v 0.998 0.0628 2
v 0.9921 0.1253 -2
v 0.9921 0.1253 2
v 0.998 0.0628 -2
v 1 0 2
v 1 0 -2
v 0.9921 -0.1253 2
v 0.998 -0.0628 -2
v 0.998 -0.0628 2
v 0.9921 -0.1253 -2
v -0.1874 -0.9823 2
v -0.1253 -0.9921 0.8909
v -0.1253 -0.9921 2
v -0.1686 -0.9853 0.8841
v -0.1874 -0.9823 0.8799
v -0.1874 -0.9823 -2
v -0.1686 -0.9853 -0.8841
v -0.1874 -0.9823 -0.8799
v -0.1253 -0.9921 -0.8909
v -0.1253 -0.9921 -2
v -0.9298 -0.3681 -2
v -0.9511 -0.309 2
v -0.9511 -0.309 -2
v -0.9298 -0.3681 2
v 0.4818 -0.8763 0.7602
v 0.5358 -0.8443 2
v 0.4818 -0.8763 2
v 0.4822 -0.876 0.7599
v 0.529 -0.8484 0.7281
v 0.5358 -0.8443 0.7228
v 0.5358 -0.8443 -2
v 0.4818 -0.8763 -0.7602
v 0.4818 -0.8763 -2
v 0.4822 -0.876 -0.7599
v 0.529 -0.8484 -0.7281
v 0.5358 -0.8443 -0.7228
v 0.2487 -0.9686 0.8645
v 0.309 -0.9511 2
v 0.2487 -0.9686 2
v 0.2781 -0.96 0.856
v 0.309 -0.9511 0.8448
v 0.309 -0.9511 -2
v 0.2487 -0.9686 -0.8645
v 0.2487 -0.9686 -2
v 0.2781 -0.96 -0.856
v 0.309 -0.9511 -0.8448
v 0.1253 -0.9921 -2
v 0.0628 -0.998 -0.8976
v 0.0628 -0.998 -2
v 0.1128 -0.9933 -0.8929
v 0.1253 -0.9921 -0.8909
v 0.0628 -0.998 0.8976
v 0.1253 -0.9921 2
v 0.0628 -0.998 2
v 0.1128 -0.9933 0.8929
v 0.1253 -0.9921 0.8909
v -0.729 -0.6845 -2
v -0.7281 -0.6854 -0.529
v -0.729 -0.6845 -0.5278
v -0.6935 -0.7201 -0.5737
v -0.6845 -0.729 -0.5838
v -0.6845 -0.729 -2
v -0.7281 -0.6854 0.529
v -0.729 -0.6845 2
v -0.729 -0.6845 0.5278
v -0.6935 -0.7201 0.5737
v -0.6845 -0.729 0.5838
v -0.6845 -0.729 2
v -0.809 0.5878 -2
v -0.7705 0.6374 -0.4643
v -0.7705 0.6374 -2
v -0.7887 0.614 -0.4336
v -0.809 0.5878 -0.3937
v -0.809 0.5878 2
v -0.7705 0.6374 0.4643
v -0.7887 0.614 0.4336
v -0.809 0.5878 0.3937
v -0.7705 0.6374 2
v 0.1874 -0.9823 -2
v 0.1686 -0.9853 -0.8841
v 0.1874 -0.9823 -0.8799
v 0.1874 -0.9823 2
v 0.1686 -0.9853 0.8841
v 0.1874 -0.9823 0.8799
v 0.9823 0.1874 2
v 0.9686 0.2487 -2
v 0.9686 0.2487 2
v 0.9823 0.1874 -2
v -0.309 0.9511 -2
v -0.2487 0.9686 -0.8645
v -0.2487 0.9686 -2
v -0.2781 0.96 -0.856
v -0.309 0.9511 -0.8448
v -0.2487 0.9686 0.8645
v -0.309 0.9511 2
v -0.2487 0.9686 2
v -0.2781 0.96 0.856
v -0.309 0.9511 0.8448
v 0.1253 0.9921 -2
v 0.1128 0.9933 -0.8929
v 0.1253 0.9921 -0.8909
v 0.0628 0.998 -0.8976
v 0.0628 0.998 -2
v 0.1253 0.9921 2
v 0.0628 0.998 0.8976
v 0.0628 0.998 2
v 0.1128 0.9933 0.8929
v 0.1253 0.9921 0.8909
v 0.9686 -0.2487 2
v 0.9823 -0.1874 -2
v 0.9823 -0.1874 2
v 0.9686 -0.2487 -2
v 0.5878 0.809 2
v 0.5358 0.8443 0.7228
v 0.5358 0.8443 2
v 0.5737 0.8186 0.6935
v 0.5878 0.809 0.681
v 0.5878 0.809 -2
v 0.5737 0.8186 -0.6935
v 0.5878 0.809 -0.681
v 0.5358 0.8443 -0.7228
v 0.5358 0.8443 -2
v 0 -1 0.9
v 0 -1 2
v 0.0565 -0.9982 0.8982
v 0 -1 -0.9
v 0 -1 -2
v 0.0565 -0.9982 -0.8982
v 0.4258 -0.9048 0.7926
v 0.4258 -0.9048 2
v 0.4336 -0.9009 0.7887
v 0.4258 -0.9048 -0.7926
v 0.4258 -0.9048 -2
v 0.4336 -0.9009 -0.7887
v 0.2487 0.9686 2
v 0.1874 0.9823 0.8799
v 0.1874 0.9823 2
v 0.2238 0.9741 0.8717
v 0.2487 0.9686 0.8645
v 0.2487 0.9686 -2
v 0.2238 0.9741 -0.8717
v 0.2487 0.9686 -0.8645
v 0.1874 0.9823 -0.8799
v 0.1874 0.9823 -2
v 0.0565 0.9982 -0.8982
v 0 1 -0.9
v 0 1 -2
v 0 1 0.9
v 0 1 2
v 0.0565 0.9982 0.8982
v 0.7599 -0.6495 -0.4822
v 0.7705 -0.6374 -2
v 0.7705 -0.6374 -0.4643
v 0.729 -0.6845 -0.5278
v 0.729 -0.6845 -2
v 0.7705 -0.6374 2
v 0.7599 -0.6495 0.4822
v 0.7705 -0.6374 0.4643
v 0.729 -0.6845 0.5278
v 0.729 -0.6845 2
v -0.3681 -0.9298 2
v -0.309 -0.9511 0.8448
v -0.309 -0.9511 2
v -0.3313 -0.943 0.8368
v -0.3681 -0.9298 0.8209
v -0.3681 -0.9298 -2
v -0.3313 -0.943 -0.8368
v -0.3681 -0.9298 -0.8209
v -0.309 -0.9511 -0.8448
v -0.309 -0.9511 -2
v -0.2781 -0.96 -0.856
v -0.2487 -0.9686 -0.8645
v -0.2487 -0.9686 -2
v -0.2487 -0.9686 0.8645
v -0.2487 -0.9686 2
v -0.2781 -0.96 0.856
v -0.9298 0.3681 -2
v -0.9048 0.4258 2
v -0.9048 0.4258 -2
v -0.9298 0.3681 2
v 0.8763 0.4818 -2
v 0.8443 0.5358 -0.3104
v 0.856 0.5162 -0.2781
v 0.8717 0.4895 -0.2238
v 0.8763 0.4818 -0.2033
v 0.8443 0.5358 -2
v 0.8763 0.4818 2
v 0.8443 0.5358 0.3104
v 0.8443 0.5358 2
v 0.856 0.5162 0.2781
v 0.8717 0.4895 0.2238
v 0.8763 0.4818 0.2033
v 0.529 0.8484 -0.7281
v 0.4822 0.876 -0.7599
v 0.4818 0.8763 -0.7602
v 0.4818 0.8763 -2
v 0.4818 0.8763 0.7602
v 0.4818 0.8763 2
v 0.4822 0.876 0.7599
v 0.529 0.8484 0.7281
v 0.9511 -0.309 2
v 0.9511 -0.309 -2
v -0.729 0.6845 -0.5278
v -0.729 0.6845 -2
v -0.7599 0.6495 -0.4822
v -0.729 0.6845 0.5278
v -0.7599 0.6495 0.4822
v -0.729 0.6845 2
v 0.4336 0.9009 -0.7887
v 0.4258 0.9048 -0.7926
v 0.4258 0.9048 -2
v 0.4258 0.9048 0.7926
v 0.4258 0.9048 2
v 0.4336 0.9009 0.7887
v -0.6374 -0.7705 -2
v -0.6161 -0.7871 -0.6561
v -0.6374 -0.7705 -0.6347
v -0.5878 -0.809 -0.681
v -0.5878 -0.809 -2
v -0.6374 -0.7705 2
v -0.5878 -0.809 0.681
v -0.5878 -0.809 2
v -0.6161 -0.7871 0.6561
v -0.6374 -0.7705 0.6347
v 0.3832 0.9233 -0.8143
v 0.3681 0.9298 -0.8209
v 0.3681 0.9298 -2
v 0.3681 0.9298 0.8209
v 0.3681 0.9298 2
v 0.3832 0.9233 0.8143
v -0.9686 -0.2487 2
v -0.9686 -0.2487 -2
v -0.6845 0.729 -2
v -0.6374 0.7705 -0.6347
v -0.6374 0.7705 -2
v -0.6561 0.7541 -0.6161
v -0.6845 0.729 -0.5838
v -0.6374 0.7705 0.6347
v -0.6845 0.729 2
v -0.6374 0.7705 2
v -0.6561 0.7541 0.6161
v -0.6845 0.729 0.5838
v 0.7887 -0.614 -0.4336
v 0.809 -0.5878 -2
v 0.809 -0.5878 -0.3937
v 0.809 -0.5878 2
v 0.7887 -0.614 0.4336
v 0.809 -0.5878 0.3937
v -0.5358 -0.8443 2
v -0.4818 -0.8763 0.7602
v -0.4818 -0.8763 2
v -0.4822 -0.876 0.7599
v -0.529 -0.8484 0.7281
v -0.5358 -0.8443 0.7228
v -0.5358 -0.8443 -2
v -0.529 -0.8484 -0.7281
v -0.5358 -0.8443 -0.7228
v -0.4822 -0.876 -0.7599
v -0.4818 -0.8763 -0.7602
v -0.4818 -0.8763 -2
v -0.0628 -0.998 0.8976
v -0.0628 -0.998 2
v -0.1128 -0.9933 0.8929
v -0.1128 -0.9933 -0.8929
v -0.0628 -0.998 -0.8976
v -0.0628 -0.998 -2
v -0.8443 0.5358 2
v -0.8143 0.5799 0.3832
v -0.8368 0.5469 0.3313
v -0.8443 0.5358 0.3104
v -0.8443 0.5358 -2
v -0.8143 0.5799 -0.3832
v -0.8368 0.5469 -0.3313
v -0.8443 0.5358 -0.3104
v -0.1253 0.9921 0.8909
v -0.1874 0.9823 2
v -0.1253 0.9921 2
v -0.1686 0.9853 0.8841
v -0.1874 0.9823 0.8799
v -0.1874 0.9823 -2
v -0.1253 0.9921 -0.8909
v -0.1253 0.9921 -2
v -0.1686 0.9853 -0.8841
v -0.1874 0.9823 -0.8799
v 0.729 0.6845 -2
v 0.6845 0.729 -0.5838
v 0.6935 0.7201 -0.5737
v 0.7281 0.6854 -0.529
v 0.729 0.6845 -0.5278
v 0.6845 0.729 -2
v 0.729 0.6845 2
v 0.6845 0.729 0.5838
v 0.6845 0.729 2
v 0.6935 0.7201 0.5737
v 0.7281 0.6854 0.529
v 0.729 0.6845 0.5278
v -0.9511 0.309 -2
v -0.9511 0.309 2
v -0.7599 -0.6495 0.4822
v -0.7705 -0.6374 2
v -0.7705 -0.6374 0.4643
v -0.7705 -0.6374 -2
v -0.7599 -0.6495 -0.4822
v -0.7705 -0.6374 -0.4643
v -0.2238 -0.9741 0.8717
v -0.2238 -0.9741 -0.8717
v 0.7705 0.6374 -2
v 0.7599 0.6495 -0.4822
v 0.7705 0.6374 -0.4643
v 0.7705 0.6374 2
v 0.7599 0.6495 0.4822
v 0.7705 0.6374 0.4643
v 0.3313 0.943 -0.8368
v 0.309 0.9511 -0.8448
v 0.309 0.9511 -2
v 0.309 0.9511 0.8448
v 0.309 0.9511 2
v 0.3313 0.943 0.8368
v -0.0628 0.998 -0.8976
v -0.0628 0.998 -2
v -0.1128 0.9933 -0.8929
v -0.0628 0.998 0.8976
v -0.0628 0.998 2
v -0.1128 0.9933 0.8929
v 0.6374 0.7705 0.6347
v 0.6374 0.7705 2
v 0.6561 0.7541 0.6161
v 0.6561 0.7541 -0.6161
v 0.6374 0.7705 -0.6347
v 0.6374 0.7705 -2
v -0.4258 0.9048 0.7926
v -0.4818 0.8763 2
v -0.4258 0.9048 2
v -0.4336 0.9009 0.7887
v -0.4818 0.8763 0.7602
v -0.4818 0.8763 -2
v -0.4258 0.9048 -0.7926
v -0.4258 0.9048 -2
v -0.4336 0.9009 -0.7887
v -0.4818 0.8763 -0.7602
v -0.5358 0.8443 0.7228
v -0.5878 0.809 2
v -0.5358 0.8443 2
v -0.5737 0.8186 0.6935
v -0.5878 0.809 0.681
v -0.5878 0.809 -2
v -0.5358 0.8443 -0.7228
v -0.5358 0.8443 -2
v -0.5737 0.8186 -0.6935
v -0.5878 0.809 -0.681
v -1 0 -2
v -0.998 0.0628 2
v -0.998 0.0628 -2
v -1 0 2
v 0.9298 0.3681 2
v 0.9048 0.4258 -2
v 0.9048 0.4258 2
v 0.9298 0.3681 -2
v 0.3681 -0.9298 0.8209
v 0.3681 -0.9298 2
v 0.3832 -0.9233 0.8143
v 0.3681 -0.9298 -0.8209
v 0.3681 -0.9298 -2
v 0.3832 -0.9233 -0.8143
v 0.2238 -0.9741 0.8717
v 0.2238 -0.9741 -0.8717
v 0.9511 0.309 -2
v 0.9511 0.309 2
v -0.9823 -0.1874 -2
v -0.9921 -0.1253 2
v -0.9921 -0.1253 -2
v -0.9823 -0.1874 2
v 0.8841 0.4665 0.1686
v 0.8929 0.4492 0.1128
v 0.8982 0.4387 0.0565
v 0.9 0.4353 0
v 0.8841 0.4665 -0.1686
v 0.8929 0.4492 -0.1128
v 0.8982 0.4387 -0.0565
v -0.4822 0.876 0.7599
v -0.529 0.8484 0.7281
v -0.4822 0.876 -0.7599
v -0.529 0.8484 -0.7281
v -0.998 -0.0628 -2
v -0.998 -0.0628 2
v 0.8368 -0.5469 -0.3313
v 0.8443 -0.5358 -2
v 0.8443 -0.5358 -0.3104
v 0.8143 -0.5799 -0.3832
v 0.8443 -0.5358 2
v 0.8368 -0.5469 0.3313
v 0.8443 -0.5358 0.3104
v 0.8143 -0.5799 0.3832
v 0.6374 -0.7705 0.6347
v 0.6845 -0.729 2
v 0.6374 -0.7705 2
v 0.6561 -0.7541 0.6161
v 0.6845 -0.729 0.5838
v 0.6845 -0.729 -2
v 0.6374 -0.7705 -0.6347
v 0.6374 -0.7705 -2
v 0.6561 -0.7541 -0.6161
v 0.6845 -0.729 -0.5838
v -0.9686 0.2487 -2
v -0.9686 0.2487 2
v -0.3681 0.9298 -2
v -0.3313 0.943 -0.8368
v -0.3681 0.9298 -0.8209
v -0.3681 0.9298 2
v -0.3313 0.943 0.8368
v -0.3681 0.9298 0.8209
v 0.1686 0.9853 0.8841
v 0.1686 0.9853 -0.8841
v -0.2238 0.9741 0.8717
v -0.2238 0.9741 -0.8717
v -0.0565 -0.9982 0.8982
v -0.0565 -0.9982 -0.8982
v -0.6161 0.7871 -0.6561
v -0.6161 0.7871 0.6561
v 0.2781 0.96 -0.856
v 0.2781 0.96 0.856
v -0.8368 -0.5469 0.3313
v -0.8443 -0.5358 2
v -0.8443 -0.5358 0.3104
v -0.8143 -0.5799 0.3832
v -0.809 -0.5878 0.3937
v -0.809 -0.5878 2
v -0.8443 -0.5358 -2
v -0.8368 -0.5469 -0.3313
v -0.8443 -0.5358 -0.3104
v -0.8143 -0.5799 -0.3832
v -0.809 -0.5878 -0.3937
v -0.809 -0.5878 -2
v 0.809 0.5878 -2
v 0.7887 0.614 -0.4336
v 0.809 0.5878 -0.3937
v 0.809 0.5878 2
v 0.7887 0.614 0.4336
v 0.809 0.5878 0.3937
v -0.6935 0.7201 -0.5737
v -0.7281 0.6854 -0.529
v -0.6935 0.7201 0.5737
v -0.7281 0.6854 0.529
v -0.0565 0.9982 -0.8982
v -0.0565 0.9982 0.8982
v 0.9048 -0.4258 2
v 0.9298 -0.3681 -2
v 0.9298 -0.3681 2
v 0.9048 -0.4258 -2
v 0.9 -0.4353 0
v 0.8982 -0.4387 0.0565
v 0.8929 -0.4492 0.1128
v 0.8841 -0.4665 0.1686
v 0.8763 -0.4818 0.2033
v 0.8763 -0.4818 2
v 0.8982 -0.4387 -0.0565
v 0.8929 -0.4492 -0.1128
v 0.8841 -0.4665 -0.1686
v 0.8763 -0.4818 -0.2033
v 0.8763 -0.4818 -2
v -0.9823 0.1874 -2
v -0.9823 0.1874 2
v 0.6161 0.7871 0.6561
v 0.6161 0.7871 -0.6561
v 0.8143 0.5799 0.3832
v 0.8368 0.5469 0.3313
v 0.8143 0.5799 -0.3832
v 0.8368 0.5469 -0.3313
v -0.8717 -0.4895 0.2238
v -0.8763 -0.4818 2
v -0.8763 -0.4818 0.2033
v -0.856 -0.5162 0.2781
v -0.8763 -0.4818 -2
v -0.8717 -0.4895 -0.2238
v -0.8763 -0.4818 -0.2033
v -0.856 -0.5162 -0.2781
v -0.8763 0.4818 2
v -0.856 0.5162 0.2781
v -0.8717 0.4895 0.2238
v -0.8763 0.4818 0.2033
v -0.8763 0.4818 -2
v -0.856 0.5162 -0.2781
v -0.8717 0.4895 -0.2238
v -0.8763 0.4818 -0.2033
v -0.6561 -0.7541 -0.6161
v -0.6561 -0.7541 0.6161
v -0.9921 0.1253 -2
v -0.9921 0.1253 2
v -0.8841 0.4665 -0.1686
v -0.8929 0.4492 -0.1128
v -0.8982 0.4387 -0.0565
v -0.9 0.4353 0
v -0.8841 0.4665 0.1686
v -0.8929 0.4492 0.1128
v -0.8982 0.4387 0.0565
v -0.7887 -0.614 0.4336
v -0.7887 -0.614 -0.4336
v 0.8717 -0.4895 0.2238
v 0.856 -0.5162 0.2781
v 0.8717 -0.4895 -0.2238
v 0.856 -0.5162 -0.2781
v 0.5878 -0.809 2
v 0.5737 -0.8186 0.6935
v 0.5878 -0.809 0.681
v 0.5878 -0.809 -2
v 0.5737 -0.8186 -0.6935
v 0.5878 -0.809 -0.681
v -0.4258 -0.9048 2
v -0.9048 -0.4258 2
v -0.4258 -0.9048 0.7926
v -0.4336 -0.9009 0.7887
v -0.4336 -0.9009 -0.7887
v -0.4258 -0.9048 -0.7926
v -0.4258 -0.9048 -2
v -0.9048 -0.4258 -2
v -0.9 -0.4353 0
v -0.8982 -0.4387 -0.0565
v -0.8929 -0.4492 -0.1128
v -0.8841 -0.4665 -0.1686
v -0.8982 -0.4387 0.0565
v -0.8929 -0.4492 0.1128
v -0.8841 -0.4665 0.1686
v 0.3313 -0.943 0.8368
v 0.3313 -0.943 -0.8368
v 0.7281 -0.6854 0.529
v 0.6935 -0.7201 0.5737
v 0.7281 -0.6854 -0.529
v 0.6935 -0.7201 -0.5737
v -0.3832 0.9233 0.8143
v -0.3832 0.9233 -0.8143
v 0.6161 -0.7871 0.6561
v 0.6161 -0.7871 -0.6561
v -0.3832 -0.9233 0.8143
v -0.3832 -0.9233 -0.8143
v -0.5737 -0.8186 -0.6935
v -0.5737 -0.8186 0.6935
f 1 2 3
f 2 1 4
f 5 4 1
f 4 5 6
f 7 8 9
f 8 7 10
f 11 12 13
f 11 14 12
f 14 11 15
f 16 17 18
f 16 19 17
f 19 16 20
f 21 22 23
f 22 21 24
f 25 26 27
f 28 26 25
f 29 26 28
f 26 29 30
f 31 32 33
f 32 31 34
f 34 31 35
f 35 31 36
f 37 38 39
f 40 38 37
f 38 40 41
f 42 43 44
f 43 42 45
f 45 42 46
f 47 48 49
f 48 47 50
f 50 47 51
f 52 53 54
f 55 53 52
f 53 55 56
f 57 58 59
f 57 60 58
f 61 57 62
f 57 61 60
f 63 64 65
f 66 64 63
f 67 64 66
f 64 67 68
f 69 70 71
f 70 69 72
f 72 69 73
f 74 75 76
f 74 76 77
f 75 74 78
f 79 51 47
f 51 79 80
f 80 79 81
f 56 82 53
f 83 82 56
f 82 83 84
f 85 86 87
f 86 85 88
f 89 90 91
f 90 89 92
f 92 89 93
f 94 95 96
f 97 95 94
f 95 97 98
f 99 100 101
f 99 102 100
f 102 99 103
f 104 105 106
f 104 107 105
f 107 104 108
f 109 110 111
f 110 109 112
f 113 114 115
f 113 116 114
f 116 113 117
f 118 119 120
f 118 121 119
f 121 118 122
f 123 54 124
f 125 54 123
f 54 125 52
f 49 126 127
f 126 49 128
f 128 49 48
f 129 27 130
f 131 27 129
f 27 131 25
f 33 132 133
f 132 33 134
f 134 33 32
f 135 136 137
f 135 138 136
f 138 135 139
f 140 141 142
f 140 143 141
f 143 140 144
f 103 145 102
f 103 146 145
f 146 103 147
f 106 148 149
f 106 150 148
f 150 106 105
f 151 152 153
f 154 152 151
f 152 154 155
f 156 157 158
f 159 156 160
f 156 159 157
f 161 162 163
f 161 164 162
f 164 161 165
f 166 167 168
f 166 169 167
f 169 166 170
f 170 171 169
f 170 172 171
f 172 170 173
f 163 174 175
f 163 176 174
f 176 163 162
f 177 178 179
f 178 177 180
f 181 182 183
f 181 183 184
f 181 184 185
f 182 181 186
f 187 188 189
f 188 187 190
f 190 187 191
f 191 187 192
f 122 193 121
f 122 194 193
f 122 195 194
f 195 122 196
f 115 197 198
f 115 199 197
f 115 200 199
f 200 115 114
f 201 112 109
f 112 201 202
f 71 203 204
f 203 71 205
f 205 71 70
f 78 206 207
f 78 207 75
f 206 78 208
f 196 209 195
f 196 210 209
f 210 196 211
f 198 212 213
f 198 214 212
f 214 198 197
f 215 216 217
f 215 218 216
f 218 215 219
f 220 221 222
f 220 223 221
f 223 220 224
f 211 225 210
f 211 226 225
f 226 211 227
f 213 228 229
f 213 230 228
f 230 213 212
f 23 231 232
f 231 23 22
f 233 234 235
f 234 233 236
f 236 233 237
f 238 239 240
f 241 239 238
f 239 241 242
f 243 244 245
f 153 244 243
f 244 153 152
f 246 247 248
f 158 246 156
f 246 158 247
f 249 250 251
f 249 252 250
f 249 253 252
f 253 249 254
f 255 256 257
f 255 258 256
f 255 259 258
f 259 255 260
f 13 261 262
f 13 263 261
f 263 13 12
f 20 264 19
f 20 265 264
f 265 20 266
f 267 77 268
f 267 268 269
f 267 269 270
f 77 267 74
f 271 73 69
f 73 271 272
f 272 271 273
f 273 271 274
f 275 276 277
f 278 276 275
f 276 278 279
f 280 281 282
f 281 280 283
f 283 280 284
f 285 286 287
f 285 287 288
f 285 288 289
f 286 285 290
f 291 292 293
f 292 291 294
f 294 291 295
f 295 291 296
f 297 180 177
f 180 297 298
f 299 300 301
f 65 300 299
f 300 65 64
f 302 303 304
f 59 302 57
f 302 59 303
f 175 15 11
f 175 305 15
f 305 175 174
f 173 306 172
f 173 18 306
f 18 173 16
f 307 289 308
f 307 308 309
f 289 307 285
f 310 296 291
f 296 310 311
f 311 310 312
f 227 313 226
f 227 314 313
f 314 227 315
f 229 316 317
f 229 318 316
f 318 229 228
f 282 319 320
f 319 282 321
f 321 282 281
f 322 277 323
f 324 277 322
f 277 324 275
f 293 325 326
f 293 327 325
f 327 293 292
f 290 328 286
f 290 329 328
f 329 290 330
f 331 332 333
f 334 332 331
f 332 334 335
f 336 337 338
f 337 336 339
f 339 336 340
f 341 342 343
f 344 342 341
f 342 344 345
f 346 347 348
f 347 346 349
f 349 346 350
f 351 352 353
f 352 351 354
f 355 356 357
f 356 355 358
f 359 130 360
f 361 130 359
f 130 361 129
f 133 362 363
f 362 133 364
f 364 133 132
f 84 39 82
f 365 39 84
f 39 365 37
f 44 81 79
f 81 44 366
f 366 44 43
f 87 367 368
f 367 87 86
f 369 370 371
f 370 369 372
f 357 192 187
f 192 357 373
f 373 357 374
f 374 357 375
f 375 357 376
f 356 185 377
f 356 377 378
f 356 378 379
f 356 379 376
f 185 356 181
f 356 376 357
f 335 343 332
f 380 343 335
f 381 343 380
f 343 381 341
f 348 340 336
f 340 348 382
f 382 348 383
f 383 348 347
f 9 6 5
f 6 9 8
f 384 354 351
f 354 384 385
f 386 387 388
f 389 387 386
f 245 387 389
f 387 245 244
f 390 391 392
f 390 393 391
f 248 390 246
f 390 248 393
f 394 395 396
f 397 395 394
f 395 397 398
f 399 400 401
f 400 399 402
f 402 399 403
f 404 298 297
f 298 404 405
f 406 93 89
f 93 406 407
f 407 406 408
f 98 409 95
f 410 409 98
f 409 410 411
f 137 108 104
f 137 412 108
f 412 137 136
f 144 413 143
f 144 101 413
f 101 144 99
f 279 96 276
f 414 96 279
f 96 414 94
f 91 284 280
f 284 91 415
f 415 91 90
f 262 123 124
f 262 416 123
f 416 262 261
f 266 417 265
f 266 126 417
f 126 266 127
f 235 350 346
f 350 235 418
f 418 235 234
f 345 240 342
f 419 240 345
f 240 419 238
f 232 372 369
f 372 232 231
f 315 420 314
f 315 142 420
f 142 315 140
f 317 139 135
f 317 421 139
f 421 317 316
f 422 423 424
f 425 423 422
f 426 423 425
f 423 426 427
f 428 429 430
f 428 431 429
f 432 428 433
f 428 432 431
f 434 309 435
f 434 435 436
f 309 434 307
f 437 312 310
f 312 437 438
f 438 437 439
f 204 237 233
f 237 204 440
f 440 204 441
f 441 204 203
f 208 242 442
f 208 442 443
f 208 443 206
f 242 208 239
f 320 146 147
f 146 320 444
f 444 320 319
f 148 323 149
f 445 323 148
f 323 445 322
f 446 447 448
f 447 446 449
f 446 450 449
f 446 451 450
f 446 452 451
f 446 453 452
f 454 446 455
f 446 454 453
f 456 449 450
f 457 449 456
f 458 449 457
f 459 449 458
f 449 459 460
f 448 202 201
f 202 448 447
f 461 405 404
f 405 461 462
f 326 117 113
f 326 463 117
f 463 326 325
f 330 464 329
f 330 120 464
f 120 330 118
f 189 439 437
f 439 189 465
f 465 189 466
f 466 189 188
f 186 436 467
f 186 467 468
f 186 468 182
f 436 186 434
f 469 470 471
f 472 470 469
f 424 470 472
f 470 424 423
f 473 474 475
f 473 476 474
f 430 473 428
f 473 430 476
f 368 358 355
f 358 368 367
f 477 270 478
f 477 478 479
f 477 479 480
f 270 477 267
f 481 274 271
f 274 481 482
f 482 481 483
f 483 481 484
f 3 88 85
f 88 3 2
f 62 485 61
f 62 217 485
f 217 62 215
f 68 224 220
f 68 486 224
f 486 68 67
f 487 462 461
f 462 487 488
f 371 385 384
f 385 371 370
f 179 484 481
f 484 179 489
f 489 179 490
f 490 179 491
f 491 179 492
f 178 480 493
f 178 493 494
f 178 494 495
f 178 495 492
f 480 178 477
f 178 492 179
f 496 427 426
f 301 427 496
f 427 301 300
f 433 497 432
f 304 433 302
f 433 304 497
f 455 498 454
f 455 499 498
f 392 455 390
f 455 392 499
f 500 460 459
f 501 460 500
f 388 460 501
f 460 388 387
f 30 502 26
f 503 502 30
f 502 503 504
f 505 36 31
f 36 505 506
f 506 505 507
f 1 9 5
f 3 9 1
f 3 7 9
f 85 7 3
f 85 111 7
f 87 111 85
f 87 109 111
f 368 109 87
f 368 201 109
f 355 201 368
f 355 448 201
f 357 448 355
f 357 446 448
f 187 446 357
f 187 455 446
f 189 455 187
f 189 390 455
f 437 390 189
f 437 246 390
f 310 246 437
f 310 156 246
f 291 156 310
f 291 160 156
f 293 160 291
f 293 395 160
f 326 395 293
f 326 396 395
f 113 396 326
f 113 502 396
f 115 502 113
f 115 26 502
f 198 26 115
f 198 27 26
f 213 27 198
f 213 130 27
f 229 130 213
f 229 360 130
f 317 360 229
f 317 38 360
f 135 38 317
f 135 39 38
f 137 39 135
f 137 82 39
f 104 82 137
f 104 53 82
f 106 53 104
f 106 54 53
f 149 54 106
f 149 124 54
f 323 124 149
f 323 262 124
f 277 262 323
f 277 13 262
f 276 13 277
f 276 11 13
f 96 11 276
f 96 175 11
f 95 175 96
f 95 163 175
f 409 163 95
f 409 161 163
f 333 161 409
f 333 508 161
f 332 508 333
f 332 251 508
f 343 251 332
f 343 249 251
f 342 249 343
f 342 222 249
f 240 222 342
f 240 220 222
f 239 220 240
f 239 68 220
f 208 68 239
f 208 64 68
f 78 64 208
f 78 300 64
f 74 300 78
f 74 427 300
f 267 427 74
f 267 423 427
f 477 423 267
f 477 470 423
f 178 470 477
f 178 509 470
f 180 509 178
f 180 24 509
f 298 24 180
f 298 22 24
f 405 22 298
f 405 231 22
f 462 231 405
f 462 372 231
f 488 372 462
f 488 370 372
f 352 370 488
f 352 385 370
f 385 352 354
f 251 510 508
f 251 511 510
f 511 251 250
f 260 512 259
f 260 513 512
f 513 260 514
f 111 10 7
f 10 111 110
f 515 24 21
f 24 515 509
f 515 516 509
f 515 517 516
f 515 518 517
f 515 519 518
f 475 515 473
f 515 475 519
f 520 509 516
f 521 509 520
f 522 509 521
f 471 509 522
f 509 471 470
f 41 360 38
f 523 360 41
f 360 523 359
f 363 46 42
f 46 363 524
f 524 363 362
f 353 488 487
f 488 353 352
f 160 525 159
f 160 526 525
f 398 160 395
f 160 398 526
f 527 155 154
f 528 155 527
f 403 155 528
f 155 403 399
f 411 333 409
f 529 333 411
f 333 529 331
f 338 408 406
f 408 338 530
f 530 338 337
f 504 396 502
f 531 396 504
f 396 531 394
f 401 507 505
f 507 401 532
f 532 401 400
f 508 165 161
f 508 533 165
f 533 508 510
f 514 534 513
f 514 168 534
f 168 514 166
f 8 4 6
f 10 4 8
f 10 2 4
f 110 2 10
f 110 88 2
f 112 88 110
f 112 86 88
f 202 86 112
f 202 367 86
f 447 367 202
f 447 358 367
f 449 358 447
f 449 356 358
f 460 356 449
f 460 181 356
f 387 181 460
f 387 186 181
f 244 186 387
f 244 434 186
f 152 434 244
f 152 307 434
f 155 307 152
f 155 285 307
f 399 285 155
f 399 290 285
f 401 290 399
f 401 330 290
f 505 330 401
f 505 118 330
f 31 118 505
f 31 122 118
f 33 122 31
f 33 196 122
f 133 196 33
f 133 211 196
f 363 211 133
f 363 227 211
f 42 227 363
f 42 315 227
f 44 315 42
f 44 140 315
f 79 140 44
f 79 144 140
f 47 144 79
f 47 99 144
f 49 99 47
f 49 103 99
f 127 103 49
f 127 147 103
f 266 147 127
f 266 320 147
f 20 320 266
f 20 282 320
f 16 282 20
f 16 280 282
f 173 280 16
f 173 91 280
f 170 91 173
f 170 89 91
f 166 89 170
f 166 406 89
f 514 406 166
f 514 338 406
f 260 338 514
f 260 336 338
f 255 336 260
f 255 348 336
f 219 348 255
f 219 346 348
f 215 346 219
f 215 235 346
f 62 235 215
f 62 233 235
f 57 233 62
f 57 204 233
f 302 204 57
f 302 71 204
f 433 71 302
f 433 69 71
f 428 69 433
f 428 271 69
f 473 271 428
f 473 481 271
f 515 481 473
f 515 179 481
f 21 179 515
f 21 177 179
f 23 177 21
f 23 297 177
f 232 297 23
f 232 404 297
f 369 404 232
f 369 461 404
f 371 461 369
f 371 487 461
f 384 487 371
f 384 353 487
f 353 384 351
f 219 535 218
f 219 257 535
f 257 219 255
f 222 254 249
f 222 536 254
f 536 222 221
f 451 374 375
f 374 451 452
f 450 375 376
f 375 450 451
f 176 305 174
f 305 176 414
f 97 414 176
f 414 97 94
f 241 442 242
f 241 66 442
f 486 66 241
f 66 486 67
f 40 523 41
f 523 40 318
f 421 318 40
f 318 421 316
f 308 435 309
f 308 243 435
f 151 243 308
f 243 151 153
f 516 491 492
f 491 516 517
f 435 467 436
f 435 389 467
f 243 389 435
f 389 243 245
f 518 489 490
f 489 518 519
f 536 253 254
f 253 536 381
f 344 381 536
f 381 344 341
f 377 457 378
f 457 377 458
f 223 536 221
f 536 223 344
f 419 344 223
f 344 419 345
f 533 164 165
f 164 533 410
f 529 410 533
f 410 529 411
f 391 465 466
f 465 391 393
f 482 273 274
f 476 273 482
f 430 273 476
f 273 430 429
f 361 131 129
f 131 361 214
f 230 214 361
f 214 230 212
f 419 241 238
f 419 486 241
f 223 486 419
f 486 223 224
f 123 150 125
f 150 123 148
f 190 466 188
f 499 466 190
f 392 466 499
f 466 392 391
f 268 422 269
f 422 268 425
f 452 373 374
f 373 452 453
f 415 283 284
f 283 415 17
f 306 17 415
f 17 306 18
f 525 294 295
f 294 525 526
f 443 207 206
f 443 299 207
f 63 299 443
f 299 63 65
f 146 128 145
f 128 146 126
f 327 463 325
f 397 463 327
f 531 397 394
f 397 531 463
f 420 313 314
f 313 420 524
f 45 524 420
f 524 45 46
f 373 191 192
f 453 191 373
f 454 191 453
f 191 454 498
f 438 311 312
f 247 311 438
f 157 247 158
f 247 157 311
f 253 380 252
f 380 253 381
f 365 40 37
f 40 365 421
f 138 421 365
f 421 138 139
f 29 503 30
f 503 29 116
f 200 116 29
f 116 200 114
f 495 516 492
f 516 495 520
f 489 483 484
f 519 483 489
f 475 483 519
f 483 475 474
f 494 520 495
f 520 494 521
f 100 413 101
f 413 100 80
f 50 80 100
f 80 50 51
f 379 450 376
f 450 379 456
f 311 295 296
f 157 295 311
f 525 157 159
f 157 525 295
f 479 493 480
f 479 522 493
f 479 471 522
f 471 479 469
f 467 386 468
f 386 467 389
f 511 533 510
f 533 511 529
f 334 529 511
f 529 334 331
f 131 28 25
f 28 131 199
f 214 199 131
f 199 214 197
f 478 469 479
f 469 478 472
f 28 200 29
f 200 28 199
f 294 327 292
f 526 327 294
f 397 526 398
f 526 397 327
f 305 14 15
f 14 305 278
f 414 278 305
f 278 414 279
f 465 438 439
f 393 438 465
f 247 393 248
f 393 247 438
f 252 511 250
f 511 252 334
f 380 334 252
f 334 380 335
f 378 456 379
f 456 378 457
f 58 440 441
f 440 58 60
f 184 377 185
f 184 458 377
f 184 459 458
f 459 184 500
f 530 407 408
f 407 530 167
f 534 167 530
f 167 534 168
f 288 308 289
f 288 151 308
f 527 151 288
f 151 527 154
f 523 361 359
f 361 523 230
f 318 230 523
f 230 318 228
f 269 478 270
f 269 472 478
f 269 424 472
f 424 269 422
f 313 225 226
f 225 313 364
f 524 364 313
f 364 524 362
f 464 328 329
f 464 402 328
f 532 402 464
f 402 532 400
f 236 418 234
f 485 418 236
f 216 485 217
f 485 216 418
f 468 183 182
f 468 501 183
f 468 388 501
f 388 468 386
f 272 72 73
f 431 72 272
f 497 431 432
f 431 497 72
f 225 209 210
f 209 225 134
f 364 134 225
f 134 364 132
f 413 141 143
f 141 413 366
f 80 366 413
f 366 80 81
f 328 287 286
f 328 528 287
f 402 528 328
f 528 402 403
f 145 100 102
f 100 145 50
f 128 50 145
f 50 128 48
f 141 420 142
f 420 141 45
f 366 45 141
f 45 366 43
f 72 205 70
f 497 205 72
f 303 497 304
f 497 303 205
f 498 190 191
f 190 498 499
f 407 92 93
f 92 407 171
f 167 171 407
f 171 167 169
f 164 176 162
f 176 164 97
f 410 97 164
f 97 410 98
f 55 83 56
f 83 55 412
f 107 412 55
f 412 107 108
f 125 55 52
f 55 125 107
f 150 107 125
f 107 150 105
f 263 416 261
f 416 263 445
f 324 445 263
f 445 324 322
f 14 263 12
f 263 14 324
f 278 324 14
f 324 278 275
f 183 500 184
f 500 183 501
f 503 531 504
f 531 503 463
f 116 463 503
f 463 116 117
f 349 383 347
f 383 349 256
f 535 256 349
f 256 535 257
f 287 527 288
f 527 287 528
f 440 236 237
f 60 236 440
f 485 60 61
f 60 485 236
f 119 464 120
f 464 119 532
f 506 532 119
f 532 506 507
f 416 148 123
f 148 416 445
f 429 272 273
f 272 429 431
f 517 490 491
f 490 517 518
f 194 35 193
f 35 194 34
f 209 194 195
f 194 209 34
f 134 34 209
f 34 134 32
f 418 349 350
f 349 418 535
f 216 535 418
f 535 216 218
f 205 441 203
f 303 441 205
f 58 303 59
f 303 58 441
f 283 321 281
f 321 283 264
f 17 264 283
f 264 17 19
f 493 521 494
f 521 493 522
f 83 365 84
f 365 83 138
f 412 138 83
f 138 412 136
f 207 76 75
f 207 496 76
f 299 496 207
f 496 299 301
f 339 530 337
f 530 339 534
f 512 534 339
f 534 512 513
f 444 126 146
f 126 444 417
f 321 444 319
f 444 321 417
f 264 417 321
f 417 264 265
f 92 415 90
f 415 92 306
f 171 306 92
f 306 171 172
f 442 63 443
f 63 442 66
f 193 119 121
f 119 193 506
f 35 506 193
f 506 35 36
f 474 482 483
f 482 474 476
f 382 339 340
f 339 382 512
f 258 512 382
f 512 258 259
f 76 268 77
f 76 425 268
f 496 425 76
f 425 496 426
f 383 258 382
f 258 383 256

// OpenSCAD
// See http://en.wikibooks.org/wiki/OpenSCAD_User_Manual/The_OpenSCAD_Language#CSG_Modeling

difference() {
	cylinder (h = 4, r=1, center = true, $fn=100);
	rotate ([90,0,0]) cylinder (h = 4, r=0.9, center = true, $fn=100);
}
